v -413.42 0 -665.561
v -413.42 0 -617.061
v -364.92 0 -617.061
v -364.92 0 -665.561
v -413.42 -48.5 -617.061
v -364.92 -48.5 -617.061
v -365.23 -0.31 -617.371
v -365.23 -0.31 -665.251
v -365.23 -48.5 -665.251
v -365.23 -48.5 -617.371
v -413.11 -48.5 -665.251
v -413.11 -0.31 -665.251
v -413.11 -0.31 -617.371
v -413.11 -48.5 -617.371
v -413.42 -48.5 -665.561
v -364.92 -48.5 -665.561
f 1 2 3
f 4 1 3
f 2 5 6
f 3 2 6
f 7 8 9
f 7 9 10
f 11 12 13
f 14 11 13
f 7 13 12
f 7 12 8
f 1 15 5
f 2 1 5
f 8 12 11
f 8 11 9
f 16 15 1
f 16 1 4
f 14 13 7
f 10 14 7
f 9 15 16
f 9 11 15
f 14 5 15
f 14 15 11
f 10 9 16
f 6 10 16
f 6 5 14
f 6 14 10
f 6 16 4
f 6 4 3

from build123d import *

# Parameters (mm, degrees)
F2_W     = 47.88
F2_H     = 47.88
F3_DEPTH = 0.31
F2_W_2   = 48.5
F2_H_2   = 48.5
F4_DEPTH = 48.5


with BuildPart() as f3:
    # F2 (on Front) → F3 (new body)
    with BuildSketch(Plane.XZ):
        with Locations((-389.1698562622, -641.3108897276)):
            Rectangle(F2_W, F2_H)
    extrude(amount=F3_DEPTH)

    # F2 (on Front) → F4 (join)
    with BuildSketch(Plane.XZ):
        with Locations((-389.1698562622, -641.3108897276)):
            Rectangle(F2_W_2, F2_H_2)
        with Locations((-389.1698562622, -641.3108897276)):
            Rectangle(F2_W, F2_H, mode=Mode.SUBTRACT)
    extrude(amount=F4_DEPTH)


solid = f3.part
